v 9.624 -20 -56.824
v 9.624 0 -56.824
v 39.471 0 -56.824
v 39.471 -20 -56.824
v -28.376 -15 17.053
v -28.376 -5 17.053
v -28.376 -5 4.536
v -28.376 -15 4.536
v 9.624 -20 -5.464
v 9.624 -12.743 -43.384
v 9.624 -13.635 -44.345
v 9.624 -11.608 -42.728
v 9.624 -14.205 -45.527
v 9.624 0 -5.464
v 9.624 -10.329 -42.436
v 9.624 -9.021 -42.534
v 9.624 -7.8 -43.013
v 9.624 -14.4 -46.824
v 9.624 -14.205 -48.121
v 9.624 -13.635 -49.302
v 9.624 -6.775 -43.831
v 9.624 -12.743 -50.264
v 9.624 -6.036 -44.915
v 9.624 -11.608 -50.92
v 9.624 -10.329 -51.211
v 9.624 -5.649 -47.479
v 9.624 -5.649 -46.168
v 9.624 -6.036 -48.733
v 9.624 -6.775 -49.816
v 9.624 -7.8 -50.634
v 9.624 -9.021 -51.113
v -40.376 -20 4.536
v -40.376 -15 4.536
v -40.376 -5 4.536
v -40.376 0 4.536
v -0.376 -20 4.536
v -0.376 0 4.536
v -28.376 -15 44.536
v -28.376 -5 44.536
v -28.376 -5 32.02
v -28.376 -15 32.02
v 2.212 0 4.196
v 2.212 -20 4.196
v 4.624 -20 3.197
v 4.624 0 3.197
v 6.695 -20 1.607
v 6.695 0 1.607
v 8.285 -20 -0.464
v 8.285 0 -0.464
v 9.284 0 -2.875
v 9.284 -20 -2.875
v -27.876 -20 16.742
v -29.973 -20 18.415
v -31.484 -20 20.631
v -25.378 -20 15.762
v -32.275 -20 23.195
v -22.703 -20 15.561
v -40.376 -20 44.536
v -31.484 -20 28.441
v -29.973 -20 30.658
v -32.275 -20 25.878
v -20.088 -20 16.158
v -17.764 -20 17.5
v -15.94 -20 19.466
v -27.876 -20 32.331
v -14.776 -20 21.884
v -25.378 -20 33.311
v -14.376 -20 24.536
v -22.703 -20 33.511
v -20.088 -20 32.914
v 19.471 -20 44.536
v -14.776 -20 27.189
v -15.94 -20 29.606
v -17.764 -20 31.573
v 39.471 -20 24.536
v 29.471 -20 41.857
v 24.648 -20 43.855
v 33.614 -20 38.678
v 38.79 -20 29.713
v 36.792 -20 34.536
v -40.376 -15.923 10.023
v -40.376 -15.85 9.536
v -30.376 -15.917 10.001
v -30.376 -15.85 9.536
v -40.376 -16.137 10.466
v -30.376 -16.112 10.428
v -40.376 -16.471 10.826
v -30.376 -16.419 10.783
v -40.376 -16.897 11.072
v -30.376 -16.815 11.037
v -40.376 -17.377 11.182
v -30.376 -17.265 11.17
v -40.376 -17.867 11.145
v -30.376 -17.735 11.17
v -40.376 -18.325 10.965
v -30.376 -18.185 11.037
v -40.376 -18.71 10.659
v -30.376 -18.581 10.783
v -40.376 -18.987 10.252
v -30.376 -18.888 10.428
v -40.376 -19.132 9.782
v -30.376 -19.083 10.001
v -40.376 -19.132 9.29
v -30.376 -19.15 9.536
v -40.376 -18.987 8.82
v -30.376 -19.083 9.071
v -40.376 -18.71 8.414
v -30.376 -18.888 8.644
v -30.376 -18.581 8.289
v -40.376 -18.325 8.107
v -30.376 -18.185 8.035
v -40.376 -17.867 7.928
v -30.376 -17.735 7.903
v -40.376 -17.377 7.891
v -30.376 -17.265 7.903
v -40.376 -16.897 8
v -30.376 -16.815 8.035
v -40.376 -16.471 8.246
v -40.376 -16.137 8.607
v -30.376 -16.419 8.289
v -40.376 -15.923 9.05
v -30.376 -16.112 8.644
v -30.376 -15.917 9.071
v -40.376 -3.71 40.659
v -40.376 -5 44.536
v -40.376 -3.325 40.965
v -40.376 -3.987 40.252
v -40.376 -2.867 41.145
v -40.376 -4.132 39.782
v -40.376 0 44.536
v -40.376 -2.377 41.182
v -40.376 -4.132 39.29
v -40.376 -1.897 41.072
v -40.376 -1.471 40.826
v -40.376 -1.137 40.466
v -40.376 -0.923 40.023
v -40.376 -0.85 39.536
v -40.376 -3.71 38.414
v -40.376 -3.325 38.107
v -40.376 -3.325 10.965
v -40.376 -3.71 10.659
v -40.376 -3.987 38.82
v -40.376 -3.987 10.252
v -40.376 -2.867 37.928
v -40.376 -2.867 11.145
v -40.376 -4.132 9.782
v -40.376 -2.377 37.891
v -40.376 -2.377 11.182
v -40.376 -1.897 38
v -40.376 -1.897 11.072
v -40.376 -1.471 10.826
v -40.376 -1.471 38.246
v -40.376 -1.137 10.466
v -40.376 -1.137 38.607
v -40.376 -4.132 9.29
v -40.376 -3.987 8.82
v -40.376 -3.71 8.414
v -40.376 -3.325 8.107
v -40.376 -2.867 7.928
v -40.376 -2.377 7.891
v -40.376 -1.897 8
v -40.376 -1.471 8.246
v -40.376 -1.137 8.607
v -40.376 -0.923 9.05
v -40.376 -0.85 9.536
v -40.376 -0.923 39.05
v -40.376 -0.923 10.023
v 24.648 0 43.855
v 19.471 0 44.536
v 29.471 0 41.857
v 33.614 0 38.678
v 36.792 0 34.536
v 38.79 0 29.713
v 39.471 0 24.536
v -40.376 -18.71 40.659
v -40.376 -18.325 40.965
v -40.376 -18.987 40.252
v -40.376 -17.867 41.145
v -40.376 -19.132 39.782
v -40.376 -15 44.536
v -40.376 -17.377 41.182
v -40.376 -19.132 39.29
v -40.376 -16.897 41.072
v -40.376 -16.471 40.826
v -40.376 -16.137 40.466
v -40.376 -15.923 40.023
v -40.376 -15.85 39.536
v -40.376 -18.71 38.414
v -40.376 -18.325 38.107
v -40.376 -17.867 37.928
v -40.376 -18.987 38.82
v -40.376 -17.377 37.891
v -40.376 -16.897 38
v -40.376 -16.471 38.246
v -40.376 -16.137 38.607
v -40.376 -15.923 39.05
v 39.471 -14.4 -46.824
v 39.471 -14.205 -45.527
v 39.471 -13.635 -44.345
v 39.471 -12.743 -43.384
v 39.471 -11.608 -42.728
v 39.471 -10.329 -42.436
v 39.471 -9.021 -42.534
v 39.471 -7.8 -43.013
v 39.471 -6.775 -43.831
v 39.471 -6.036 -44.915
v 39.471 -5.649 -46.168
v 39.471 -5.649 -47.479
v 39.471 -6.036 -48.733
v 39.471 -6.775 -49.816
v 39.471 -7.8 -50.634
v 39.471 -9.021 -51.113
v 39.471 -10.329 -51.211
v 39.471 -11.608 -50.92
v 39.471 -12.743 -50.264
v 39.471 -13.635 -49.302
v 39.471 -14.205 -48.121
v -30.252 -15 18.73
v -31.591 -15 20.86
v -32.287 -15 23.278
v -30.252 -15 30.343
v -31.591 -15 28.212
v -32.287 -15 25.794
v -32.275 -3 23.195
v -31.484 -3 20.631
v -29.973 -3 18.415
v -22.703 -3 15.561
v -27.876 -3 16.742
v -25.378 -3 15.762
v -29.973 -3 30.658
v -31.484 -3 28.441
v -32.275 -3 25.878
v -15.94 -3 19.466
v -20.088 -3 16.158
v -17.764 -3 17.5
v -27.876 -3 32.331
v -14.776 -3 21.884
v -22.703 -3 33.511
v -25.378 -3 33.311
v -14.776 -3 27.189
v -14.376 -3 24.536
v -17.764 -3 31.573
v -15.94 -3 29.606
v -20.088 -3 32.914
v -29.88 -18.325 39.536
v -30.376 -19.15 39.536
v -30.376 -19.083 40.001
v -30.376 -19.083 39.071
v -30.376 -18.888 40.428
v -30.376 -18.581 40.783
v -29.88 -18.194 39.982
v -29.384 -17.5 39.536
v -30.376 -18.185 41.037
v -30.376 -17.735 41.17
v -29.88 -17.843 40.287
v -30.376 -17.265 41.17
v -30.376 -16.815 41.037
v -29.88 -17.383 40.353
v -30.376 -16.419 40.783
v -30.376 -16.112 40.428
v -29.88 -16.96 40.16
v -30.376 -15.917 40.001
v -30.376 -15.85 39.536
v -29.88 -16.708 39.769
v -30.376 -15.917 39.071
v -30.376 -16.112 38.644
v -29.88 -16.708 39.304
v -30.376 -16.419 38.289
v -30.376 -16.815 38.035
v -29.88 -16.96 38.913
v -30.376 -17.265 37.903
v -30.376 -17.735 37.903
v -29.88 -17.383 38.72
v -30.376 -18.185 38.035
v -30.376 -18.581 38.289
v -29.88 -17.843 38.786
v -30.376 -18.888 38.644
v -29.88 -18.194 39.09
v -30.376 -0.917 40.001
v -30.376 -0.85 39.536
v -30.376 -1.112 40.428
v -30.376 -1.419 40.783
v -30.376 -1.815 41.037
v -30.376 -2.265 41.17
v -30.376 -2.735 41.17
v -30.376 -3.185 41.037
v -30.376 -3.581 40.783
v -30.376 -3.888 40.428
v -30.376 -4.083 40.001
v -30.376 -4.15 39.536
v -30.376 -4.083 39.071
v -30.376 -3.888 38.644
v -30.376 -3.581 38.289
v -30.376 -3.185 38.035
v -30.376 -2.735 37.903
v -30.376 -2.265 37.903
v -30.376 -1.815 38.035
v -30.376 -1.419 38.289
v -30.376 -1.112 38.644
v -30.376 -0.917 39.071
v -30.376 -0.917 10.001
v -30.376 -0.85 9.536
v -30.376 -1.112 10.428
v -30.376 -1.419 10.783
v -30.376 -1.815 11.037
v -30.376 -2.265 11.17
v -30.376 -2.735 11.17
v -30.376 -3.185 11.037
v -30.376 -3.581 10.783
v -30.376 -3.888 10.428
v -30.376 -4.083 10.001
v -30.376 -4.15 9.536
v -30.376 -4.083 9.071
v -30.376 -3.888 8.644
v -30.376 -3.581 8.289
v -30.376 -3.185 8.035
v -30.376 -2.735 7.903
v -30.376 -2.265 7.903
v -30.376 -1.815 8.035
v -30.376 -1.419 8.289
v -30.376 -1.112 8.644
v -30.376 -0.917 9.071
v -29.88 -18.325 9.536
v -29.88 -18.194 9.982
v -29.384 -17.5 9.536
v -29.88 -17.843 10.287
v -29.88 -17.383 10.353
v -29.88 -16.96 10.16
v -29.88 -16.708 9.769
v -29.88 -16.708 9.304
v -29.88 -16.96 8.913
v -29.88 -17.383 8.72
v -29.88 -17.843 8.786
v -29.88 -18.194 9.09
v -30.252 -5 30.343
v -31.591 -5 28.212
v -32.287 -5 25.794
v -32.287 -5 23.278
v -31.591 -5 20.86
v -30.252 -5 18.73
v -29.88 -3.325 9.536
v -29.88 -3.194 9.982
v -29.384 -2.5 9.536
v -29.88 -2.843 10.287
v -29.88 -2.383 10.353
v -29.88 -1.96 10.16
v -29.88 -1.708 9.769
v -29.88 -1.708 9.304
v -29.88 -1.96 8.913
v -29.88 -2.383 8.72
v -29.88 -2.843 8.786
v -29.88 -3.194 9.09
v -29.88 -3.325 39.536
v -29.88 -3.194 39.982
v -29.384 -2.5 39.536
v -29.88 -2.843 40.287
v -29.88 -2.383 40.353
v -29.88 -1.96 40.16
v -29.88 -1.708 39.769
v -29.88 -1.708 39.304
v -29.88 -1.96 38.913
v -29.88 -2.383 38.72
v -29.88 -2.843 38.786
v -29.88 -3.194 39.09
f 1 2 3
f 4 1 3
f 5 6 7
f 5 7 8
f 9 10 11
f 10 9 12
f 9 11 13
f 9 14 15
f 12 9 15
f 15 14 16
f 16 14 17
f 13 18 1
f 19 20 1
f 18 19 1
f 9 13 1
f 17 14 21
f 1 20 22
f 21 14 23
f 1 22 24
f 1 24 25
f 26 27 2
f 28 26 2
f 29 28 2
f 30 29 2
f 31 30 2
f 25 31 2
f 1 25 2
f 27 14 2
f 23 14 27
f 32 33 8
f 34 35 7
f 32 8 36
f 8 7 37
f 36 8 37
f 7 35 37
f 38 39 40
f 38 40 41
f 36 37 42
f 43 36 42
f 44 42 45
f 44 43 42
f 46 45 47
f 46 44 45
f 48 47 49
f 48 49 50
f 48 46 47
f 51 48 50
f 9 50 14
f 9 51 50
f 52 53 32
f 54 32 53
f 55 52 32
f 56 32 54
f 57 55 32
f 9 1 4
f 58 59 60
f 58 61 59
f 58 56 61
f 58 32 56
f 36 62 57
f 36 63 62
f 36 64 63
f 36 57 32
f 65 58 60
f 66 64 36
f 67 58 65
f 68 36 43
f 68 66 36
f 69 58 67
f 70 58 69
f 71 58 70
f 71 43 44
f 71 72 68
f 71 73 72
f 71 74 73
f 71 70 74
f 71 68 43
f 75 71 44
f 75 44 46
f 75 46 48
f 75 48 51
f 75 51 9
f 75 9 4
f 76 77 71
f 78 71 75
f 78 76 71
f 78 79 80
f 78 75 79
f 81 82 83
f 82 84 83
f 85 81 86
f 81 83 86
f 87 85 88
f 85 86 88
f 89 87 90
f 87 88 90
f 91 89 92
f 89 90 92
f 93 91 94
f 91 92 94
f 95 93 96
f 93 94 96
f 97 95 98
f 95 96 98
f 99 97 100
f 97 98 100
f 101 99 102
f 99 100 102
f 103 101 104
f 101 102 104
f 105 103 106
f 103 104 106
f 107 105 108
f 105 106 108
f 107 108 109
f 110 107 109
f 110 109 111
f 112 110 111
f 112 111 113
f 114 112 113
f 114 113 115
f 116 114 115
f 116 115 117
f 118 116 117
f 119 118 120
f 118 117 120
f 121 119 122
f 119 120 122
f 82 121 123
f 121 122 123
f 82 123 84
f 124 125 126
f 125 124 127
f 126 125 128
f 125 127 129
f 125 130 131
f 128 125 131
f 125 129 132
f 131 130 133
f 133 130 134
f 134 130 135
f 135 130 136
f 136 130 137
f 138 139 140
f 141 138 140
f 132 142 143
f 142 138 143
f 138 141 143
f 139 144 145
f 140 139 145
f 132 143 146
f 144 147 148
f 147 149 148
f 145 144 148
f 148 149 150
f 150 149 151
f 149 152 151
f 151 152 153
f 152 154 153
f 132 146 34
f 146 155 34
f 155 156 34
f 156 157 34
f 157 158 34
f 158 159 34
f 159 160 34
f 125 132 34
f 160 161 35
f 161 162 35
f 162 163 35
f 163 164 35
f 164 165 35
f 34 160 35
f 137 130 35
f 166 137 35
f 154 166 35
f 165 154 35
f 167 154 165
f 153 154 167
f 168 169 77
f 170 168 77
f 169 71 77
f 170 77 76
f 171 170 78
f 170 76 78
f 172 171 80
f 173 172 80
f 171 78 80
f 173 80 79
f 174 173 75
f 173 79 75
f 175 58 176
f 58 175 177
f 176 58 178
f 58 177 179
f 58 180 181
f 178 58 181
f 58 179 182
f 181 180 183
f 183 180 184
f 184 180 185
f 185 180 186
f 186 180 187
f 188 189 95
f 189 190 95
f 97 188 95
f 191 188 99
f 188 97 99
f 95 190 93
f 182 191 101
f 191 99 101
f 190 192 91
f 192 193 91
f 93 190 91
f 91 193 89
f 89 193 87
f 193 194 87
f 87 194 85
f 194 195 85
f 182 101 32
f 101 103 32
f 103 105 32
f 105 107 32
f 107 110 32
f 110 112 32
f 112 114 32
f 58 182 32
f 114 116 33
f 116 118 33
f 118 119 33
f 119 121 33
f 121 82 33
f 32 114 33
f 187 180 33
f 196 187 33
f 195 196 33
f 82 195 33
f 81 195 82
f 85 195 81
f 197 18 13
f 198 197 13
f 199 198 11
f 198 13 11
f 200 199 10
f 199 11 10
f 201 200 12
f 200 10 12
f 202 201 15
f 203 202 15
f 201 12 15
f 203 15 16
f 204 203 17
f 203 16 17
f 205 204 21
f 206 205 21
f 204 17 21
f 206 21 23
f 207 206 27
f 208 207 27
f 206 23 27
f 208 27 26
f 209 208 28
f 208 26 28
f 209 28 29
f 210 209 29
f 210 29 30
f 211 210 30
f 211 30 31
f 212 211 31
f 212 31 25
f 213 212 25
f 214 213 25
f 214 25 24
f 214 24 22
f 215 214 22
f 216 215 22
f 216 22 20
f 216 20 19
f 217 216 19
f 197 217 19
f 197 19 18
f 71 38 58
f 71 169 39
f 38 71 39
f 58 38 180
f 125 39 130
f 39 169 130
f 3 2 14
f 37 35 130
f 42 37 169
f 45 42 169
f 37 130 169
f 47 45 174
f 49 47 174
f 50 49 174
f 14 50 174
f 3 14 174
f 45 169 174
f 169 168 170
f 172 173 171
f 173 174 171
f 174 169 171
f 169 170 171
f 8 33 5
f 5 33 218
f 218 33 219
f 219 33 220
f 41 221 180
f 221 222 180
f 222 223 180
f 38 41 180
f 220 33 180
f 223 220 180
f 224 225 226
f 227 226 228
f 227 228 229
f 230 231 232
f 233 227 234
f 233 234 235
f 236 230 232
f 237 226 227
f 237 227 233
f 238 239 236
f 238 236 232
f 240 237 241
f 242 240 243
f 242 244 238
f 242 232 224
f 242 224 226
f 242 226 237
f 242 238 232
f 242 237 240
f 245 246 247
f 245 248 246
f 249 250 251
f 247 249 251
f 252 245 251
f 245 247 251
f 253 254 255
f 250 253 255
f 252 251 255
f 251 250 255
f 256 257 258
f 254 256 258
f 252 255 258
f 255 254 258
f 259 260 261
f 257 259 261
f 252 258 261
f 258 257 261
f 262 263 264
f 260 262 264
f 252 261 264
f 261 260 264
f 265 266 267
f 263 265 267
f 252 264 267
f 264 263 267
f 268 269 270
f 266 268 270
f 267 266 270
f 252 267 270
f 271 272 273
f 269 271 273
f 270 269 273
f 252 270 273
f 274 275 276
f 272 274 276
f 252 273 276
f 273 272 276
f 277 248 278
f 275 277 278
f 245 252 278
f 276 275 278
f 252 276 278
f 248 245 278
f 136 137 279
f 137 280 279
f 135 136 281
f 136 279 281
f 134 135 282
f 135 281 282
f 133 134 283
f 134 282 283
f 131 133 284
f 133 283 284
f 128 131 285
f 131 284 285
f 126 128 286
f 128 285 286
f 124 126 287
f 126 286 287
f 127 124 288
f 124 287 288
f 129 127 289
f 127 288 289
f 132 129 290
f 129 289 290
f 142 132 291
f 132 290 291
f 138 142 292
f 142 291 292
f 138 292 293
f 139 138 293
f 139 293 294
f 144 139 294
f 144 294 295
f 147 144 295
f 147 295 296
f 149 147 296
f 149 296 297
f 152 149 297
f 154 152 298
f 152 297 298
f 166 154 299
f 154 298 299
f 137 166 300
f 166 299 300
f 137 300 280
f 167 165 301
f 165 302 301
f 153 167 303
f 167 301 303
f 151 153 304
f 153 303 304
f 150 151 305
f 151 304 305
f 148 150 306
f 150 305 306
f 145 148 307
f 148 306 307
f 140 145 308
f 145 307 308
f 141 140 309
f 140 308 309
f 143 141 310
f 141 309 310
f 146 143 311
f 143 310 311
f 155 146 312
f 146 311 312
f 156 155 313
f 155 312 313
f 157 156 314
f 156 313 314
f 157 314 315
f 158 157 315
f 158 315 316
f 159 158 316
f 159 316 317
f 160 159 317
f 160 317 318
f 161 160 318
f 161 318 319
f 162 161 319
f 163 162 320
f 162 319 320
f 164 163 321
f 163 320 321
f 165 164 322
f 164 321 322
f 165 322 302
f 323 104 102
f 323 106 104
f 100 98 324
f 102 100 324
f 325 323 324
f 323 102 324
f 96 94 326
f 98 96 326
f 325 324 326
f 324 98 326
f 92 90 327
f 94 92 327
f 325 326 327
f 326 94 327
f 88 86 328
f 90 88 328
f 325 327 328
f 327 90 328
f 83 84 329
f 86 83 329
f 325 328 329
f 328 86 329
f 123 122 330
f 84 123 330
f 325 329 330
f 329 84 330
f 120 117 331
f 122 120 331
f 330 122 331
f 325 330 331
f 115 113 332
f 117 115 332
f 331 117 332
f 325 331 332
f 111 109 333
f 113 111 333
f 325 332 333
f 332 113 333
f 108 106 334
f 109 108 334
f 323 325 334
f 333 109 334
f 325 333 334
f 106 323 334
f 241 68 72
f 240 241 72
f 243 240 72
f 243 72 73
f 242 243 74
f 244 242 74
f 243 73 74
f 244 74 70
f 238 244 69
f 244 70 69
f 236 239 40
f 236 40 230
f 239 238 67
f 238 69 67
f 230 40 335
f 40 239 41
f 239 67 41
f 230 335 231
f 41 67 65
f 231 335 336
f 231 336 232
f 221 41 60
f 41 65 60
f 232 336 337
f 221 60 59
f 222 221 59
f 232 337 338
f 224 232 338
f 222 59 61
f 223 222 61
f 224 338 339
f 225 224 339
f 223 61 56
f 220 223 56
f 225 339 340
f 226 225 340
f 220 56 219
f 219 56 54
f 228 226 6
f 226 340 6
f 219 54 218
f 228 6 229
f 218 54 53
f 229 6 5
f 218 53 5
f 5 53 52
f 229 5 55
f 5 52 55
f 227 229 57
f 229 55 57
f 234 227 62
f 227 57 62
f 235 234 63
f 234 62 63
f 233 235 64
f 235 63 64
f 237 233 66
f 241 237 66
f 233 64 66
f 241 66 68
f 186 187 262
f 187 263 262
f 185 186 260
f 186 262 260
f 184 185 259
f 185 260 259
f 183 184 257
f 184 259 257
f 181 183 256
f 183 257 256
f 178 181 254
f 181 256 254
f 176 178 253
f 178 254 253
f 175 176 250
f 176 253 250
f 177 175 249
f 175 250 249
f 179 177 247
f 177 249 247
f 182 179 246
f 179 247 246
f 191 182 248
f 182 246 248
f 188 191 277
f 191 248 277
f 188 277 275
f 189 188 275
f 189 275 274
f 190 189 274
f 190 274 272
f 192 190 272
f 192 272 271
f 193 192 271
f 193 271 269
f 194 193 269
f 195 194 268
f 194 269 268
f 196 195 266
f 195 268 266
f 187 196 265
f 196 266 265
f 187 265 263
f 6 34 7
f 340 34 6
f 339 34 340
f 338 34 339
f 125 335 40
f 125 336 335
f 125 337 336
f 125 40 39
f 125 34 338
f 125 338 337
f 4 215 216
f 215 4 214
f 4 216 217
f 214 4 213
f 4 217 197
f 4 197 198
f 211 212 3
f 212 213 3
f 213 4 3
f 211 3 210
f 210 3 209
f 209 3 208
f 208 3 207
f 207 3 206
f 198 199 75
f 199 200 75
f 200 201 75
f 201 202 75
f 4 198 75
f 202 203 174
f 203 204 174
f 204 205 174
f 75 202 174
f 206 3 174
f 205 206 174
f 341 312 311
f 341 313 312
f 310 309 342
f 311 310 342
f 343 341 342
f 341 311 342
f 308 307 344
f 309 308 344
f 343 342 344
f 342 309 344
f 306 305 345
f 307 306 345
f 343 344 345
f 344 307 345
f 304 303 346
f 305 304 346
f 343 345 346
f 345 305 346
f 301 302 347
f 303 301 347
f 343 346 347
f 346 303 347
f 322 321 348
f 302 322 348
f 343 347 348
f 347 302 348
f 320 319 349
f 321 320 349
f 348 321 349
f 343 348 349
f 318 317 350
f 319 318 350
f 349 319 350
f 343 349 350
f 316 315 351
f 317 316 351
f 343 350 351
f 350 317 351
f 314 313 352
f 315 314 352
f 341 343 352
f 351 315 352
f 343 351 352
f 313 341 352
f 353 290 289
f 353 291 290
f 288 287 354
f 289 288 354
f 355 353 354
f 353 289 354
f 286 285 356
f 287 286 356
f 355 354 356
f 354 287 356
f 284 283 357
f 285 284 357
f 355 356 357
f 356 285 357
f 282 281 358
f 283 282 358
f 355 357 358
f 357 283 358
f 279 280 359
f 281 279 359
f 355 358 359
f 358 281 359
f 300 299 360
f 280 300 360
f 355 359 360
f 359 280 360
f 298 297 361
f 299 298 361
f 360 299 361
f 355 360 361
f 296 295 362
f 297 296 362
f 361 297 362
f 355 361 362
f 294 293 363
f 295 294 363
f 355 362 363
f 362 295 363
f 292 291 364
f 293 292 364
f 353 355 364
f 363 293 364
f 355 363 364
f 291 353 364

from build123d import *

# Parameters (mm, degrees)
F1_DEPTH  = 20
F2_R      = 10
F3_R      = 20
F5_D      = 8.8
F6_W      = 10
F6_H      = 40
F7_DEPTH  = 12
F8_R      = 9
F9_DEPTH  = 17
F11_D     = 3.3
F11_DEPTH = 10
F11_TIP   = 0.9914200214


with BuildPart() as f1:
    # F0 (on Front) → F1 (new body)
    with BuildSketch(Plane.XZ):
        Polygon((39.4714460536, 44.5363200395), (-40.3757039464, 44.5363200395), (-40.3757039464, 4.5363200395), (9.6242960536, 4.5363200395), (9.6242960536, -56.8236818447), (39.4714460536, -56.8236818447), align=None)
    extrude(amount=F1_DEPTH)

    # F2
    f2_edges = [f1.edges().sort_by_distance(p)[0] for p in [
        (9.624296, -10, 4.53632),
    ]]
    fillet(f2_edges, radius=F2_R)

    # F3
    f3_edges = [f1.edges().sort_by_distance(p)[0] for p in [
        (39.471446, -10, 44.53632),
    ]]
    fillet(f3_edges, radius=F3_R)

    # F5 (through all)
    with Locations(Plane.YZ.offset(39.4714460536)):
        with Locations((-10, -46.8236818447)):
            Hole(F5_D / 2)

    # F6 (on face) → F7 (cut)
    with BuildSketch(Plane(origin=(-40.3757039464, 0, 0), x_dir=(0, -1, 0), z_dir=(-1, 0, 0))):
        with Locations((10, 24.5363200395)):
            Rectangle(F6_W, F6_H)
    extrude(amount=-F7_DEPTH, mode=Mode.SUBTRACT)

    # F8 (on face) → F9 (cut)
    with BuildSketch(Plane.XZ.offset(20)):
        with Locations((-23.3757039464, 24.5363200395)):
            Circle(F8_R)
    extrude(amount=-F9_DEPTH, mode=Mode.SUBTRACT)

    # F11
    with Locations(Plane(origin=(-40.3757039464, 0, 0), x_dir=(0, -1, 0), z_dir=(-1, 0, 0))):
        with Locations((2.5, 39.5363200395), (17.5, 39.5363200395), (17.5, 9.5363200395), (2.5, 9.5363200395)):
            Hole(F11_D / 2, depth=F11_DEPTH)
            with Locations((0, 0, -(F11_DEPTH + F11_TIP / 2))):  # 118° drill point
                Cone(0, F11_D / 2, F11_TIP, mode=Mode.SUBTRACT)


solid = f1.part
